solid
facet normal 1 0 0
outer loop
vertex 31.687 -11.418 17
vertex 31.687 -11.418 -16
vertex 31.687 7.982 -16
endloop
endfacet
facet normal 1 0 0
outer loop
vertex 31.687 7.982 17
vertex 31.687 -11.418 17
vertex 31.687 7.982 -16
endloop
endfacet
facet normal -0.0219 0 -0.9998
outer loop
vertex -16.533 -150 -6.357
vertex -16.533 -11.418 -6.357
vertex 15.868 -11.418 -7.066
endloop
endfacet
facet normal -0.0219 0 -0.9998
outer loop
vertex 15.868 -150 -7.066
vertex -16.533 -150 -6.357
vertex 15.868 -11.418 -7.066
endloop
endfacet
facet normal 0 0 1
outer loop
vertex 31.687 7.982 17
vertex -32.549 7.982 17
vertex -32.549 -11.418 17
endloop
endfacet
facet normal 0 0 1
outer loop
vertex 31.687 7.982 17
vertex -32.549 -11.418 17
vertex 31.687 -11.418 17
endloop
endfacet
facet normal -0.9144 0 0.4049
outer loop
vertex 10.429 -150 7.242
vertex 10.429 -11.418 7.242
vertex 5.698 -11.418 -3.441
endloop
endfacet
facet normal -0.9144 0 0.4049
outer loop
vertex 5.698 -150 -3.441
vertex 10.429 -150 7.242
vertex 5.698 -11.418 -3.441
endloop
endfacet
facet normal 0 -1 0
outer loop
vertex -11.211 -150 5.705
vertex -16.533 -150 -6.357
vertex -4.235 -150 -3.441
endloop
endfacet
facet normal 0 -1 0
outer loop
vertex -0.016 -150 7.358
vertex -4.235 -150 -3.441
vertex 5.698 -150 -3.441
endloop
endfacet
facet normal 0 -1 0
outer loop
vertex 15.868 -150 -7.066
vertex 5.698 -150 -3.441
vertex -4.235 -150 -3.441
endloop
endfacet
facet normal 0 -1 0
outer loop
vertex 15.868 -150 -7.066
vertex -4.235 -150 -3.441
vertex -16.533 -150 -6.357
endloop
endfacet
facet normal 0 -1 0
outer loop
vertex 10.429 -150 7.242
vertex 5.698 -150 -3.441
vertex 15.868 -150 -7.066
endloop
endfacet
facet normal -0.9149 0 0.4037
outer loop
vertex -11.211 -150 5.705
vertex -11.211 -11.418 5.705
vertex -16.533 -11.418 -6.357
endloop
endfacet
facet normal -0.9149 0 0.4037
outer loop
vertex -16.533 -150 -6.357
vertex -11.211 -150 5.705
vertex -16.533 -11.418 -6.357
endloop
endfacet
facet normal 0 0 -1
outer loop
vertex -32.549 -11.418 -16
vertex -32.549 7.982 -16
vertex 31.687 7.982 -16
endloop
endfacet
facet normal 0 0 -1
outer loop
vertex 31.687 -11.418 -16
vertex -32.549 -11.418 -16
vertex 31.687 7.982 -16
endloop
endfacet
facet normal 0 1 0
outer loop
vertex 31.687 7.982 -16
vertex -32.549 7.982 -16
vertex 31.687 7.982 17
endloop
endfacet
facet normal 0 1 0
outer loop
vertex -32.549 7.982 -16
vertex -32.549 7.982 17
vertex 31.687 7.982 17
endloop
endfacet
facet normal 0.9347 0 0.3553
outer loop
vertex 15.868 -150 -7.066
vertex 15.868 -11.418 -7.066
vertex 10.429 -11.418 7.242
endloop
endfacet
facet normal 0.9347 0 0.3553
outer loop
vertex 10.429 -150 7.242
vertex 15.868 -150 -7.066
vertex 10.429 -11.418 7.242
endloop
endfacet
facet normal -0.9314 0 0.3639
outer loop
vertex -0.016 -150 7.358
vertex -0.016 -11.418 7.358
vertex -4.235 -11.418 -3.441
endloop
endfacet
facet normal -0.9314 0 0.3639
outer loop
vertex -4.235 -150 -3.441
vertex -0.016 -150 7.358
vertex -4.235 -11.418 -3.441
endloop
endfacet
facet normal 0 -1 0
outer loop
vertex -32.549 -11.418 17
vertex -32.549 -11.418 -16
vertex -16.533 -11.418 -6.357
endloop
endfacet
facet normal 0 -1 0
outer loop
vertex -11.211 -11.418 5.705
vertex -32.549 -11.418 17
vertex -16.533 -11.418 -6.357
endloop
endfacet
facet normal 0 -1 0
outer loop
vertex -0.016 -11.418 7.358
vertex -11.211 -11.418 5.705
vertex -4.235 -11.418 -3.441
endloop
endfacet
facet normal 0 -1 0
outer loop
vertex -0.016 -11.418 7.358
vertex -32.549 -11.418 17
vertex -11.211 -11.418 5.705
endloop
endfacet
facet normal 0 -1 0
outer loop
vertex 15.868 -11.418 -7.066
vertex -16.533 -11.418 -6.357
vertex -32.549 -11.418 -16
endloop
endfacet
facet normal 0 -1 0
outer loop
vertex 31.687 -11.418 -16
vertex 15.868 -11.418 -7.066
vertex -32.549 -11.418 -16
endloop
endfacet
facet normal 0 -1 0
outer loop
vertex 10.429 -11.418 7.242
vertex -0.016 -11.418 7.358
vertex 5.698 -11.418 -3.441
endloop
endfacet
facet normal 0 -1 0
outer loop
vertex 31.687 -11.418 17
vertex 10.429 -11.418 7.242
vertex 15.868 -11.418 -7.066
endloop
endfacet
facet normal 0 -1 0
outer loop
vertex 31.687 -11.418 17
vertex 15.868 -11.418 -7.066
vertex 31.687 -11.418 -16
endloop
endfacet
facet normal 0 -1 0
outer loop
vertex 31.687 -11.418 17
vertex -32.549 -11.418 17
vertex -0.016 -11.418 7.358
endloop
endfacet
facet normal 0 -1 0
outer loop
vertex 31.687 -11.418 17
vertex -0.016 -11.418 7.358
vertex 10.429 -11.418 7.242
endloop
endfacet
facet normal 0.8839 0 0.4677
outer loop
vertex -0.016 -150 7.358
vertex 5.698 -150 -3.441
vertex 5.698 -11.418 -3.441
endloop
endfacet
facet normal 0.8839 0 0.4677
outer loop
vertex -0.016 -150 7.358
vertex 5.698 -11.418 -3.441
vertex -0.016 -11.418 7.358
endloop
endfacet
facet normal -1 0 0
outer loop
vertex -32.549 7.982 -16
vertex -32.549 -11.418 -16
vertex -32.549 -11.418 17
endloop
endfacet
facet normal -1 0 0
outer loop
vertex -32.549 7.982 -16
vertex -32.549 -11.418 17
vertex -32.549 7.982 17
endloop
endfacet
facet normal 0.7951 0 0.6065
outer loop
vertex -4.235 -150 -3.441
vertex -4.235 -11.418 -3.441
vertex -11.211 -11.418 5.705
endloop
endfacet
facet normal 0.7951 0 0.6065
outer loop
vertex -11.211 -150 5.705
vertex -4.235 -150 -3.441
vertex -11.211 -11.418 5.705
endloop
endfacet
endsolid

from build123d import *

# Parameters (mm, degrees)
F1_DEPTH      = 150
F2_W          = 64.235858
F2_H          = 19.400093
F3_DEPTH      = 17
F3_DEPTH_BACK = 16


with BuildPart() as f1:
    # F0 (on Front) → F1 (new body)
    with BuildSketch(Plane.XZ):
        Polygon((-11.211432, 5.705079), (-16.532733, -6.356537), (15.868079, -7.066044), (10.428526, 7.242345), (5.698481, -3.44145), (-0.016305, 7.358057), (-4.234615, -3.44145), align=None)
    extrude(amount=F1_DEPTH)

    # F2 (on Top) → F3 (join, two sides)
    with BuildSketch(Plane.XY) as f3_sk:
        with Locations((-0.431113, -1.717609)):
            Rectangle(F2_W, F2_H)
    extrude(amount=F3_DEPTH)
    extrude(f3_sk.sketch, amount=-F3_DEPTH_BACK)


solid = f1.part
